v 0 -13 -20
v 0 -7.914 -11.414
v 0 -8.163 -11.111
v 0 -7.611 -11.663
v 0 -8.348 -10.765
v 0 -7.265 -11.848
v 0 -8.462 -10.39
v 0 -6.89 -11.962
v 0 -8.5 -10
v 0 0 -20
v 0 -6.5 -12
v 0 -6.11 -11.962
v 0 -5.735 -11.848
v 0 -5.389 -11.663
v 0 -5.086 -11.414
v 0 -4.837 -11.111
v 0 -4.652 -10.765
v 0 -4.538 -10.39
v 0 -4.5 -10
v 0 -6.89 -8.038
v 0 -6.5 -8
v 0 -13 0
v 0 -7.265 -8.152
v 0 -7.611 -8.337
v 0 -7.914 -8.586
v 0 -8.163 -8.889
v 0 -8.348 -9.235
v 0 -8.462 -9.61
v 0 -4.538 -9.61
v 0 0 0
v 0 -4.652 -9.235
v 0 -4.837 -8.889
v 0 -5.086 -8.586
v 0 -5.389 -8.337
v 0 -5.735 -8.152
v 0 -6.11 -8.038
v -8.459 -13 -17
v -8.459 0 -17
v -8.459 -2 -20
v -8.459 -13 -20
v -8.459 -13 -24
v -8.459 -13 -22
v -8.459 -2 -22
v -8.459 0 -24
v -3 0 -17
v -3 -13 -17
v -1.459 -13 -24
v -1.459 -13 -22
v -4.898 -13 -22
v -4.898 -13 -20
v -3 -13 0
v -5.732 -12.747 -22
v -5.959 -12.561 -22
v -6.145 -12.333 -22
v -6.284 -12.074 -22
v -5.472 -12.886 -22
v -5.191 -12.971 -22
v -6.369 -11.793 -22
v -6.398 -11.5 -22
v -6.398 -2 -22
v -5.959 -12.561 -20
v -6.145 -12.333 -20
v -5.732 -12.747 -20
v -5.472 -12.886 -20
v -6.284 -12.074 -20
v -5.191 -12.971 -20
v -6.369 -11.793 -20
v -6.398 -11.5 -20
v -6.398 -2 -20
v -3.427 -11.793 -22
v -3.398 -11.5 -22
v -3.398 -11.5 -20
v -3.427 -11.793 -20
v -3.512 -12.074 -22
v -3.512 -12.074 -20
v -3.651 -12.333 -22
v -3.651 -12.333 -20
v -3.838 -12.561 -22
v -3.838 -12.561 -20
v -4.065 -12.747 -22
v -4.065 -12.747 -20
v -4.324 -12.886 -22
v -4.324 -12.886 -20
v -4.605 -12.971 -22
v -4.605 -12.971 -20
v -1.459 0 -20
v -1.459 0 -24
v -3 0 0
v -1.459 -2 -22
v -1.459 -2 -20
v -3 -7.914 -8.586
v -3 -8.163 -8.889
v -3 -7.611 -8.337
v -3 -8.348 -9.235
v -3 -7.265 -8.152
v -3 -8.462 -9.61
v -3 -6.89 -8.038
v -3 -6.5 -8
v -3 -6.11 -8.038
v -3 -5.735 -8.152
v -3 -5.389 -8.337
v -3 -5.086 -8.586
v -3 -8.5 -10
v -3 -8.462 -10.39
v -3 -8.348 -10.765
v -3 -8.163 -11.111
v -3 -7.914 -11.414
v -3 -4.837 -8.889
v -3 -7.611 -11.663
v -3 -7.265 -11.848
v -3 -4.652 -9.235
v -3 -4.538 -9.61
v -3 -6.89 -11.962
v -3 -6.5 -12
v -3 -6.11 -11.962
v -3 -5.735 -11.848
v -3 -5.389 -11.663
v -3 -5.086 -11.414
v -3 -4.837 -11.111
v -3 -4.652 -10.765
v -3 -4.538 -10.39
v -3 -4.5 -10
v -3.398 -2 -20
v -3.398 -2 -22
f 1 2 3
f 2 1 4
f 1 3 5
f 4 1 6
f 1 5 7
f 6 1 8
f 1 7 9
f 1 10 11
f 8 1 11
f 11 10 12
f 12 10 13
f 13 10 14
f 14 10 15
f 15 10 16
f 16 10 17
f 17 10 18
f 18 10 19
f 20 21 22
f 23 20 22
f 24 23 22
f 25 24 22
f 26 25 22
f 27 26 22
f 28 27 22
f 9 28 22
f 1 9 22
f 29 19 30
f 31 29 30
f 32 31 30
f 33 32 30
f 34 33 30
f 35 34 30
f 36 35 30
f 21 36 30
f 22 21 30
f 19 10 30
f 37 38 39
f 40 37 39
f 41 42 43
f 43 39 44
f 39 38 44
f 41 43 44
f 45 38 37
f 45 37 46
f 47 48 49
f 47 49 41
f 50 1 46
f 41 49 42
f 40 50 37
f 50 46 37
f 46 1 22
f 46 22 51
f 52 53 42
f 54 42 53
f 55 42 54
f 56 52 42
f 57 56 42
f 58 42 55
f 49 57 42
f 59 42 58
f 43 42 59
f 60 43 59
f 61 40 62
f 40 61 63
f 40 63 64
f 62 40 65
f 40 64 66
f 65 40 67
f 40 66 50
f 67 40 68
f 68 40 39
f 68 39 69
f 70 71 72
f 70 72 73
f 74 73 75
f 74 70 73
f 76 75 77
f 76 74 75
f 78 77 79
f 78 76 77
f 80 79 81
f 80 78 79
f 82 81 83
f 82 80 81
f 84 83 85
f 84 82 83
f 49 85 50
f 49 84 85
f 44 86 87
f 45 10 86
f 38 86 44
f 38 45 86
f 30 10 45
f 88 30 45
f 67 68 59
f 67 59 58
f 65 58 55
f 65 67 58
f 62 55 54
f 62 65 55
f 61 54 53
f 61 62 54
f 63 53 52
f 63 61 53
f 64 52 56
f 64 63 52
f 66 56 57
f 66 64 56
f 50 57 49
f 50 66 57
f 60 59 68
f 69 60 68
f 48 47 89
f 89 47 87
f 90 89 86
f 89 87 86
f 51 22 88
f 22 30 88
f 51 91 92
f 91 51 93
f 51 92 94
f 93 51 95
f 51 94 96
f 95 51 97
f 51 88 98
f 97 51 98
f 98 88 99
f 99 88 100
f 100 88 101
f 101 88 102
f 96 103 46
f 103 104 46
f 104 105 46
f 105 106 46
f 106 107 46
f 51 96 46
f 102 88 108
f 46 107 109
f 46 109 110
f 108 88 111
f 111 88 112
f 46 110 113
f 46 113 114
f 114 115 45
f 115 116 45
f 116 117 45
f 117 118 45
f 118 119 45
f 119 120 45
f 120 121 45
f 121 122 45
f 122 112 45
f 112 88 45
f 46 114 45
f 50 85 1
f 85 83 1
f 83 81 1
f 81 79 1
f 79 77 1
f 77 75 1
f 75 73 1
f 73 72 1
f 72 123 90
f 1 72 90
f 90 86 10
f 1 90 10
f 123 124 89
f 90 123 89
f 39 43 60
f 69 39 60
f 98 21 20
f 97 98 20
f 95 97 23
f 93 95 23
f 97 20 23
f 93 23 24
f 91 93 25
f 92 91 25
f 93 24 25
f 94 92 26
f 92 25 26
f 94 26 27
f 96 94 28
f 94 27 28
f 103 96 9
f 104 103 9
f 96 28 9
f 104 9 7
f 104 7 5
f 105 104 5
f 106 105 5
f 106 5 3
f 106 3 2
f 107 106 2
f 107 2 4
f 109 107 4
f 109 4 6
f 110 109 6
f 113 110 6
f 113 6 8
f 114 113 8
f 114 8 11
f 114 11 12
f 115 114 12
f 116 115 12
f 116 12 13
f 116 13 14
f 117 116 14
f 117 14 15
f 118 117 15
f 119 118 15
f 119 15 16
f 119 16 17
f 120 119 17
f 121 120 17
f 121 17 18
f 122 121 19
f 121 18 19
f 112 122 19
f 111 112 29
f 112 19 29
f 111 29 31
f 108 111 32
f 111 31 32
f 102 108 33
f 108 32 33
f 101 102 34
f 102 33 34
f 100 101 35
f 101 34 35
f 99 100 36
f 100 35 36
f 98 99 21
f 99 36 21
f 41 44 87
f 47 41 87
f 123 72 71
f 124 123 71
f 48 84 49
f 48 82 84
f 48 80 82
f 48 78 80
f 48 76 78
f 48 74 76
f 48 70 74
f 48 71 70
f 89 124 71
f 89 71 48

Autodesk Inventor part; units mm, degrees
ref_plane "YZ Plane" through (0, 0, 0) normal (1, 0, 0) x (0, 1, 0)
ref_plane "XZ Plane" through (0, 0, 0) normal (0, 1, 0) x (-1, 0, 0)
ref_plane "XY Plane" through (0, 0, 0) normal (0, 0, 1) x (1, 0, 0)
sketch "Sketch1" plane through (0, 0, 0) normal (0, 1, 0) x (-1, 0, 0)
  line L0 (0, 0) -> (3, 0)
  line L1 (3, 0) -> (3, -20)
  line L2 (3, -20) -> (0, -20)
  line L3 (0, -20) -> (0, 0)
  line L4 (3, -20) -> (16, -20)
  line L5 (16, -20) -> (16, -17)
  line L6 (16, -17) -> (3, -17)
  line L7 (3, -17) -> (3, -20)
  dimension "d0" = 3
  dimension "d1" = 20
  dimension "d2" = 13
  dimension "d3" = 3
extrude "Extrusion1" add sketch "Sketch1" against normal blind 13
sketch "Sketch2" plane through (0, 0, 0) normal (0, 1, 0) x (1, 0, 0)
  line L0 (-16, 20) -> (0, 20) projected
  line L1 (0, 0) -> (0, 20) projected
  line L2 (-6.3982, 20) -> (-3.3982, 20)
  line L3 (-3.3982, 20) -> (-3.3982, 22)
  line L4 (-3.3982, 22) -> (-6.3982, 22)
  line L5 (-6.3982, 22) -> (-6.3982, 20)
  line L6 (-6.3982, 20) -> (-3.3982, 22) construction
  line L7 (-6.3982, 22) -> (-3.3982, 20) construction
  line L8 (0, 20) -> (-16, 20) projected
  line L9 (-1.4593, 20) -> (-8.4593, 20)
  line L10 (-8.4593, 20) -> (-8.4593, 24)
  line L11 (-8.4593, 24) -> (-1.4593, 24)
  line L12 (-1.4593, 24) -> (-1.4593, 20)
  line L13 (-8.4593, 22) -> (-1.4593, 22)
  point P0 (-4.8982, 20)
  point P1 (-4.8982, 21)
  dimension "d6" = 4.8982
  dimension "d7" = 3
  dimension "d8" = 2
  dimension "d9" = 7
  dimension "d10" = 4
extrude "Extrusion2" add sketch "Sketch2" against normal up to surface (13 mm away) contours L5 L4 L3 L0
extrude "Extrusion3" add sketch "Sketch2" against normal blind 2
extrude "Extrusion4" add sketch "Sketch2" against normal up to surface (13 mm away) contours L10 L11 L12 L13 L4
fillet "Fillet1" radius 1.5 2 edges at (-6.3982, -13, -21) (-3.3982, -13, -21)
sketch "Sketch3" plane through (0, 0, 0) normal (0, 1, 0) x (1, 0, 0)
  line L0 (-16, 17) -> (-3, 17) projected
  line L1 (-8.4593, 20) -> (-16, 20) projected
  line L2 (-16, 17) -> (-8.4593, 17)
  line L3 (-8.4593, 17) -> (-8.4593, 20)
  line L4 (-8.4593, 20) -> (-16, 20)
  line L5 (-16, 20) -> (-16, 17)
  point P0 (0, 0)
extrude "Extrusion5" cut sketch "Sketch3" against normal up to next
sketch "Sketch7" plane through (-3, 0, -17) normal (-1, 0, 0) x (0, 0, 1)
  line L0 (0, 0) -> (17, 0) projected
  line L1 (17, 0) -> (17, -13) projected
  point P0 (7, -6.5)
  dimension "d41" = 6.5
  dimension "d42" = 10
hole "Hole2" at (-3, -6.5, -10) direction (1, 0, 0) diameter 4 end through all
properties part number "bloceur_alim"
